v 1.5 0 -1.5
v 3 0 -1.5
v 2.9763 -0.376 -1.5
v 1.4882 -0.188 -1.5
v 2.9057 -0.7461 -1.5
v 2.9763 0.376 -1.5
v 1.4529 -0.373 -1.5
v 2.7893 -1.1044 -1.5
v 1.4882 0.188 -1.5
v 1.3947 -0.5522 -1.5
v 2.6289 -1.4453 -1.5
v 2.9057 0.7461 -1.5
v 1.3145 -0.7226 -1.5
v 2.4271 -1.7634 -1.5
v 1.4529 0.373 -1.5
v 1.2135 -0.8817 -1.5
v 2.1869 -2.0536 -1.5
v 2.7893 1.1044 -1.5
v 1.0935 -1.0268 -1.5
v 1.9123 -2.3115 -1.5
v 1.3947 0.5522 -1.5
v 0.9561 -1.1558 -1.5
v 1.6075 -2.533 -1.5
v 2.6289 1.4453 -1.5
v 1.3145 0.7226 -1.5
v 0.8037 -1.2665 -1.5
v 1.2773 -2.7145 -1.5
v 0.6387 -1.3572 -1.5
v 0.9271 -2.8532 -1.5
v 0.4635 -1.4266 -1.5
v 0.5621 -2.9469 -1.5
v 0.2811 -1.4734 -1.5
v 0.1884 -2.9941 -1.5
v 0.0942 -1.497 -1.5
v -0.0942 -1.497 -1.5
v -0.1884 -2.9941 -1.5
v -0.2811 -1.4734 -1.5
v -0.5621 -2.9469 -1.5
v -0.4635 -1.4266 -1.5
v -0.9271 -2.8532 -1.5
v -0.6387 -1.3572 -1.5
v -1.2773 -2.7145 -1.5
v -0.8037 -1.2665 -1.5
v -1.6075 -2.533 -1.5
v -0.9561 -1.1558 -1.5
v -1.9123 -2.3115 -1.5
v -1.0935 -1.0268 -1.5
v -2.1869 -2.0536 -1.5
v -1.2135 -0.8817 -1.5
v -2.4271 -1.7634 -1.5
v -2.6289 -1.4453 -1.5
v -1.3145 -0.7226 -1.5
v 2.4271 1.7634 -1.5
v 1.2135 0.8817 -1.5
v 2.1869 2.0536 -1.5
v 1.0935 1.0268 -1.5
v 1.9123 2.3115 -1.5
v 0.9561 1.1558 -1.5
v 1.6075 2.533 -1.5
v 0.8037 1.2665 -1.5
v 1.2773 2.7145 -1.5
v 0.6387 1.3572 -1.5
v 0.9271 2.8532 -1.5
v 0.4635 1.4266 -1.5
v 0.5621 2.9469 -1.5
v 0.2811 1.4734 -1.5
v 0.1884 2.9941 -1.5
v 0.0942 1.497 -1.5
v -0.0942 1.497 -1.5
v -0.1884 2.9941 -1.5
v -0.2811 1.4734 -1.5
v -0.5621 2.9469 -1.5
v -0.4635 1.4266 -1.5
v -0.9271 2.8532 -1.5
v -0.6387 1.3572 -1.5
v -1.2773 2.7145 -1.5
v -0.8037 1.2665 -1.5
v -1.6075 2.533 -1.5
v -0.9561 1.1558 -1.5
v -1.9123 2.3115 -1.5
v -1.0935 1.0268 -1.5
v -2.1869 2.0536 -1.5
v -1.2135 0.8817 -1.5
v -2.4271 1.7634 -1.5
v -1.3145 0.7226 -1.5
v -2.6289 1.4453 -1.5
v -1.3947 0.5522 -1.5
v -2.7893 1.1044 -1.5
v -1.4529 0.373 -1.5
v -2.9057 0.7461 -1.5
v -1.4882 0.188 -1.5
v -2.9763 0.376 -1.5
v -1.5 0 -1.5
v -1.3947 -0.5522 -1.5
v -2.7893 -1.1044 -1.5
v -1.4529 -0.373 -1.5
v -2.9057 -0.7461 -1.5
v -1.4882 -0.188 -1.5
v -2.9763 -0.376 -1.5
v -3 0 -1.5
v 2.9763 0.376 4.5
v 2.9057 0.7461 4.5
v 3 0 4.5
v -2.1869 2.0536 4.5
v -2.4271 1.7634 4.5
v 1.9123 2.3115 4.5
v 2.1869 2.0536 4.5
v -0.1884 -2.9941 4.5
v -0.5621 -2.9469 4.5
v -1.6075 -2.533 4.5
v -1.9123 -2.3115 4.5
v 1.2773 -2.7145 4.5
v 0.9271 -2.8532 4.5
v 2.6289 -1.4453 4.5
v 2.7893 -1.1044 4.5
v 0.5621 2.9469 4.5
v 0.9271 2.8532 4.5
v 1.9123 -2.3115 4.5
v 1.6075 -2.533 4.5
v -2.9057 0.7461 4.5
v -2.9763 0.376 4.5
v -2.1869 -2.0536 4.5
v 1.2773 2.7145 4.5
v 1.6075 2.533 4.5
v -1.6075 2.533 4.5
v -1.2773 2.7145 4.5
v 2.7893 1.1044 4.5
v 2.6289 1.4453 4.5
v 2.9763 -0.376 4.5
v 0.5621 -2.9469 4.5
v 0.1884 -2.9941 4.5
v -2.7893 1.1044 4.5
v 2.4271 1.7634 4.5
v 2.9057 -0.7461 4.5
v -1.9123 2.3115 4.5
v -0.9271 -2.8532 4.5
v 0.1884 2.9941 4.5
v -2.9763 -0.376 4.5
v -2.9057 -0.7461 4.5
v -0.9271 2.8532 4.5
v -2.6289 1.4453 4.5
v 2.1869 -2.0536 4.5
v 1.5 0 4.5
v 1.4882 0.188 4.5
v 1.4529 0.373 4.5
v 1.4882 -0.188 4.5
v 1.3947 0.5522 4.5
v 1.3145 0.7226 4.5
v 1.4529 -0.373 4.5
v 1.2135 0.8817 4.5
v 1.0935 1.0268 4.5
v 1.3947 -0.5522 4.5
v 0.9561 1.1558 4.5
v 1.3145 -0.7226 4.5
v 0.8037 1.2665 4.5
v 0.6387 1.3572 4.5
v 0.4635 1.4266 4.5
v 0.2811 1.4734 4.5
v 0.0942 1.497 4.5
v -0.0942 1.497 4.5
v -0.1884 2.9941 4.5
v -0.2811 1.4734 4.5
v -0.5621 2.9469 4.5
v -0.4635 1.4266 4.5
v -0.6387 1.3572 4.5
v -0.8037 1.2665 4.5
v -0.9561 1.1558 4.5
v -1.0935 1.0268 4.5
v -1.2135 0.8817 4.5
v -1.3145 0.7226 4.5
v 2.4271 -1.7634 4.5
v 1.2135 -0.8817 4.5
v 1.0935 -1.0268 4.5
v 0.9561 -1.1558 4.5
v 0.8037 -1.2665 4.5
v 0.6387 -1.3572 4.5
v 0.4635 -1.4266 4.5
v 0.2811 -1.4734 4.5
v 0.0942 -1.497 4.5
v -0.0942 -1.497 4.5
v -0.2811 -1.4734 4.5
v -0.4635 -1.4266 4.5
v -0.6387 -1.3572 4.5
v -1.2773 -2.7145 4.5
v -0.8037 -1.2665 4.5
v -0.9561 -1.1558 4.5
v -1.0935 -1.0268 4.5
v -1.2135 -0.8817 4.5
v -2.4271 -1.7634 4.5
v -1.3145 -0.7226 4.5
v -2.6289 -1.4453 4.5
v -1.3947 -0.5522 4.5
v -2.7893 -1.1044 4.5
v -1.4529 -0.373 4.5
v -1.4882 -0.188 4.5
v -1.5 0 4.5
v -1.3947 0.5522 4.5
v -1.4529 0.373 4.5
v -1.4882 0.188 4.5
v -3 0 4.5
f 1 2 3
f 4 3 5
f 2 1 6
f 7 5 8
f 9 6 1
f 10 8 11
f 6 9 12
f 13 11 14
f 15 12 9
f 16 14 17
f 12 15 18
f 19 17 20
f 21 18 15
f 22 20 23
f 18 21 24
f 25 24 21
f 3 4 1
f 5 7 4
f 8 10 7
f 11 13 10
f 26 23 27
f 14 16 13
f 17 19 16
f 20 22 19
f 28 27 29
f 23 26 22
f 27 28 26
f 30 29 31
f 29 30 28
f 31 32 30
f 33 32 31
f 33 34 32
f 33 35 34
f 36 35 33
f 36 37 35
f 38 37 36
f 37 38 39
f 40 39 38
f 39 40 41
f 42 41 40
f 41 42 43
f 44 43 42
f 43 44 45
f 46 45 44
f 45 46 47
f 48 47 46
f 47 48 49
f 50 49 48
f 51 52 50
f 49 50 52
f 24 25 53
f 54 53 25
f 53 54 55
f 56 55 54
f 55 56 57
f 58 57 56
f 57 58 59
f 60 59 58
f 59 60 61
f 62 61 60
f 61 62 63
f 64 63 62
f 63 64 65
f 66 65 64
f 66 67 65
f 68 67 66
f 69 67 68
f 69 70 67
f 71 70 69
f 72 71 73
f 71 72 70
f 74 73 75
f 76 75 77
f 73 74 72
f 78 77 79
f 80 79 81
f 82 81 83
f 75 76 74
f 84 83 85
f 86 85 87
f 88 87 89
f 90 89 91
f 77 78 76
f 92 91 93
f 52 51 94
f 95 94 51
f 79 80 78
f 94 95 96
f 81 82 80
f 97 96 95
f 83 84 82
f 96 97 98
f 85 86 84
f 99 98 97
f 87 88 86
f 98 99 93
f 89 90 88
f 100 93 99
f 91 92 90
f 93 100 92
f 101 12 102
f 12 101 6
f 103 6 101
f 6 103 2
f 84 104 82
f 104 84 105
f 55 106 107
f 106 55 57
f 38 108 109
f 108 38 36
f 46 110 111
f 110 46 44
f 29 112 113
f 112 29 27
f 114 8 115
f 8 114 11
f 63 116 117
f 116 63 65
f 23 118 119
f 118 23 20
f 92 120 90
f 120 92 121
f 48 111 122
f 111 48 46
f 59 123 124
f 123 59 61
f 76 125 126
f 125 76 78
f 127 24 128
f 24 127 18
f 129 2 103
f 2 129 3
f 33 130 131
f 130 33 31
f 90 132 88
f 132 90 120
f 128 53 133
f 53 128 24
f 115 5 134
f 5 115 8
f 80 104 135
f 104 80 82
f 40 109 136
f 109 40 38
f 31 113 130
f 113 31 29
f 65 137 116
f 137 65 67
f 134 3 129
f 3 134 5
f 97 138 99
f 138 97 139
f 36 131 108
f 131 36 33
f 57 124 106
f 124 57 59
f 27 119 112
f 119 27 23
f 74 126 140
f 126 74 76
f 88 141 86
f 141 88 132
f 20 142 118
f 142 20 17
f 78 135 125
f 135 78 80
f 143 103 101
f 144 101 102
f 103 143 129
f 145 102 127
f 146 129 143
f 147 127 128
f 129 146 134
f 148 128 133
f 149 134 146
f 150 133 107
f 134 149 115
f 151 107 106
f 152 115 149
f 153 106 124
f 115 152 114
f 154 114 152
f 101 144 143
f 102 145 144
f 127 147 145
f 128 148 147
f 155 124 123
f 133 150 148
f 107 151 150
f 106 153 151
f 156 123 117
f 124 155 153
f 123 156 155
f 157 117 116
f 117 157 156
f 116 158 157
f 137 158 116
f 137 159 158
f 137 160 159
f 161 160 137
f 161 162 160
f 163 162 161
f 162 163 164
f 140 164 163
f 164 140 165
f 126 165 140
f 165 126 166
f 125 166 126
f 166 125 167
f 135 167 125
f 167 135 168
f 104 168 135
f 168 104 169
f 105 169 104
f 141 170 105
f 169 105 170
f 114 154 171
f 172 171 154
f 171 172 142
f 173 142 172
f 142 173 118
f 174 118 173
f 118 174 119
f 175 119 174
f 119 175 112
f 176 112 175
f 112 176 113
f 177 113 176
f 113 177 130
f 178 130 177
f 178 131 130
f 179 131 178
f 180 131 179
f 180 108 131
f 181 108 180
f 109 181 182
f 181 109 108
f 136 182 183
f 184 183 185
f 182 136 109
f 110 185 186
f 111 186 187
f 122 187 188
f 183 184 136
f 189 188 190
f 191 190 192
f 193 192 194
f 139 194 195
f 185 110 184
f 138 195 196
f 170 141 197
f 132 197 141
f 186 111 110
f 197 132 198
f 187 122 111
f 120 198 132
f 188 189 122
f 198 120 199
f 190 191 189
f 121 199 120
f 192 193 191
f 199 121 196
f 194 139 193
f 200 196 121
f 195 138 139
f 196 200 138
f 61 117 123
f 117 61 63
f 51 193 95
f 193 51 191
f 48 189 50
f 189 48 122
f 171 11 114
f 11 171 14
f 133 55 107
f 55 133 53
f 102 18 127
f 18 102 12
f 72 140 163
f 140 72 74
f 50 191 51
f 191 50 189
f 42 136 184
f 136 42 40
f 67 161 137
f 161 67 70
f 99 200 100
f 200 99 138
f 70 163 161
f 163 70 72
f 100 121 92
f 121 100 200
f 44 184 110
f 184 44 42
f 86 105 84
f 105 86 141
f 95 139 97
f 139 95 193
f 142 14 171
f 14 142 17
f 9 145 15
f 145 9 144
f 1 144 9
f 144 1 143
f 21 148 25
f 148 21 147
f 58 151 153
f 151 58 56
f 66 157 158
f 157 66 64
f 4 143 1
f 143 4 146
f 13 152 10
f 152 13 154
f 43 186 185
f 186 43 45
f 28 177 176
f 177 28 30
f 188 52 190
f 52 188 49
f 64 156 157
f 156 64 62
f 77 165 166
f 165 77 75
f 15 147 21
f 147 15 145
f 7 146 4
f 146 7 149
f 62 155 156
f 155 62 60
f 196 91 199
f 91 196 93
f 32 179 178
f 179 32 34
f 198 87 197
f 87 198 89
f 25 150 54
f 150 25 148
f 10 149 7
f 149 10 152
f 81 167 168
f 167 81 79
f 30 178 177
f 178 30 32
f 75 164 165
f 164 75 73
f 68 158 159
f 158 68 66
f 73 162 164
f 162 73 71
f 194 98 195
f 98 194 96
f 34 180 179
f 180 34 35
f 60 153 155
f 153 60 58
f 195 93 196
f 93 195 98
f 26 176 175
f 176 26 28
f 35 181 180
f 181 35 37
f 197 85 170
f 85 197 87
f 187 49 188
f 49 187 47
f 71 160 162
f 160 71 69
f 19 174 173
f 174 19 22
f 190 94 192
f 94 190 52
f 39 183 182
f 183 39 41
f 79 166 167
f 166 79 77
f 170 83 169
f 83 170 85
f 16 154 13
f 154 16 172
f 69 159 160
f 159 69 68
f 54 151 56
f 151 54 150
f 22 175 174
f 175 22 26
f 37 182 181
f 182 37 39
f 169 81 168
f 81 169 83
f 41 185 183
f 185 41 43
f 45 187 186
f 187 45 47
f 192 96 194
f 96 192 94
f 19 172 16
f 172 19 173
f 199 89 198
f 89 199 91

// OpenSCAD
$fn = 50;


difference() {
	union() {
		translate(v = [0, 0, -1.5000000000]) {
			cylinder(h = 3, r = 1.0000000000);
		}
		translate(v = [0, 0, -1.5000000000]) {
			cylinder(h = 6, r = 3.0000000000);
		}
	}
	union() {
		translate(v = [0, 0, -100.0000000000]) {
			cylinder(h = 200, r = 1.5000000000);
		}
	}
}
